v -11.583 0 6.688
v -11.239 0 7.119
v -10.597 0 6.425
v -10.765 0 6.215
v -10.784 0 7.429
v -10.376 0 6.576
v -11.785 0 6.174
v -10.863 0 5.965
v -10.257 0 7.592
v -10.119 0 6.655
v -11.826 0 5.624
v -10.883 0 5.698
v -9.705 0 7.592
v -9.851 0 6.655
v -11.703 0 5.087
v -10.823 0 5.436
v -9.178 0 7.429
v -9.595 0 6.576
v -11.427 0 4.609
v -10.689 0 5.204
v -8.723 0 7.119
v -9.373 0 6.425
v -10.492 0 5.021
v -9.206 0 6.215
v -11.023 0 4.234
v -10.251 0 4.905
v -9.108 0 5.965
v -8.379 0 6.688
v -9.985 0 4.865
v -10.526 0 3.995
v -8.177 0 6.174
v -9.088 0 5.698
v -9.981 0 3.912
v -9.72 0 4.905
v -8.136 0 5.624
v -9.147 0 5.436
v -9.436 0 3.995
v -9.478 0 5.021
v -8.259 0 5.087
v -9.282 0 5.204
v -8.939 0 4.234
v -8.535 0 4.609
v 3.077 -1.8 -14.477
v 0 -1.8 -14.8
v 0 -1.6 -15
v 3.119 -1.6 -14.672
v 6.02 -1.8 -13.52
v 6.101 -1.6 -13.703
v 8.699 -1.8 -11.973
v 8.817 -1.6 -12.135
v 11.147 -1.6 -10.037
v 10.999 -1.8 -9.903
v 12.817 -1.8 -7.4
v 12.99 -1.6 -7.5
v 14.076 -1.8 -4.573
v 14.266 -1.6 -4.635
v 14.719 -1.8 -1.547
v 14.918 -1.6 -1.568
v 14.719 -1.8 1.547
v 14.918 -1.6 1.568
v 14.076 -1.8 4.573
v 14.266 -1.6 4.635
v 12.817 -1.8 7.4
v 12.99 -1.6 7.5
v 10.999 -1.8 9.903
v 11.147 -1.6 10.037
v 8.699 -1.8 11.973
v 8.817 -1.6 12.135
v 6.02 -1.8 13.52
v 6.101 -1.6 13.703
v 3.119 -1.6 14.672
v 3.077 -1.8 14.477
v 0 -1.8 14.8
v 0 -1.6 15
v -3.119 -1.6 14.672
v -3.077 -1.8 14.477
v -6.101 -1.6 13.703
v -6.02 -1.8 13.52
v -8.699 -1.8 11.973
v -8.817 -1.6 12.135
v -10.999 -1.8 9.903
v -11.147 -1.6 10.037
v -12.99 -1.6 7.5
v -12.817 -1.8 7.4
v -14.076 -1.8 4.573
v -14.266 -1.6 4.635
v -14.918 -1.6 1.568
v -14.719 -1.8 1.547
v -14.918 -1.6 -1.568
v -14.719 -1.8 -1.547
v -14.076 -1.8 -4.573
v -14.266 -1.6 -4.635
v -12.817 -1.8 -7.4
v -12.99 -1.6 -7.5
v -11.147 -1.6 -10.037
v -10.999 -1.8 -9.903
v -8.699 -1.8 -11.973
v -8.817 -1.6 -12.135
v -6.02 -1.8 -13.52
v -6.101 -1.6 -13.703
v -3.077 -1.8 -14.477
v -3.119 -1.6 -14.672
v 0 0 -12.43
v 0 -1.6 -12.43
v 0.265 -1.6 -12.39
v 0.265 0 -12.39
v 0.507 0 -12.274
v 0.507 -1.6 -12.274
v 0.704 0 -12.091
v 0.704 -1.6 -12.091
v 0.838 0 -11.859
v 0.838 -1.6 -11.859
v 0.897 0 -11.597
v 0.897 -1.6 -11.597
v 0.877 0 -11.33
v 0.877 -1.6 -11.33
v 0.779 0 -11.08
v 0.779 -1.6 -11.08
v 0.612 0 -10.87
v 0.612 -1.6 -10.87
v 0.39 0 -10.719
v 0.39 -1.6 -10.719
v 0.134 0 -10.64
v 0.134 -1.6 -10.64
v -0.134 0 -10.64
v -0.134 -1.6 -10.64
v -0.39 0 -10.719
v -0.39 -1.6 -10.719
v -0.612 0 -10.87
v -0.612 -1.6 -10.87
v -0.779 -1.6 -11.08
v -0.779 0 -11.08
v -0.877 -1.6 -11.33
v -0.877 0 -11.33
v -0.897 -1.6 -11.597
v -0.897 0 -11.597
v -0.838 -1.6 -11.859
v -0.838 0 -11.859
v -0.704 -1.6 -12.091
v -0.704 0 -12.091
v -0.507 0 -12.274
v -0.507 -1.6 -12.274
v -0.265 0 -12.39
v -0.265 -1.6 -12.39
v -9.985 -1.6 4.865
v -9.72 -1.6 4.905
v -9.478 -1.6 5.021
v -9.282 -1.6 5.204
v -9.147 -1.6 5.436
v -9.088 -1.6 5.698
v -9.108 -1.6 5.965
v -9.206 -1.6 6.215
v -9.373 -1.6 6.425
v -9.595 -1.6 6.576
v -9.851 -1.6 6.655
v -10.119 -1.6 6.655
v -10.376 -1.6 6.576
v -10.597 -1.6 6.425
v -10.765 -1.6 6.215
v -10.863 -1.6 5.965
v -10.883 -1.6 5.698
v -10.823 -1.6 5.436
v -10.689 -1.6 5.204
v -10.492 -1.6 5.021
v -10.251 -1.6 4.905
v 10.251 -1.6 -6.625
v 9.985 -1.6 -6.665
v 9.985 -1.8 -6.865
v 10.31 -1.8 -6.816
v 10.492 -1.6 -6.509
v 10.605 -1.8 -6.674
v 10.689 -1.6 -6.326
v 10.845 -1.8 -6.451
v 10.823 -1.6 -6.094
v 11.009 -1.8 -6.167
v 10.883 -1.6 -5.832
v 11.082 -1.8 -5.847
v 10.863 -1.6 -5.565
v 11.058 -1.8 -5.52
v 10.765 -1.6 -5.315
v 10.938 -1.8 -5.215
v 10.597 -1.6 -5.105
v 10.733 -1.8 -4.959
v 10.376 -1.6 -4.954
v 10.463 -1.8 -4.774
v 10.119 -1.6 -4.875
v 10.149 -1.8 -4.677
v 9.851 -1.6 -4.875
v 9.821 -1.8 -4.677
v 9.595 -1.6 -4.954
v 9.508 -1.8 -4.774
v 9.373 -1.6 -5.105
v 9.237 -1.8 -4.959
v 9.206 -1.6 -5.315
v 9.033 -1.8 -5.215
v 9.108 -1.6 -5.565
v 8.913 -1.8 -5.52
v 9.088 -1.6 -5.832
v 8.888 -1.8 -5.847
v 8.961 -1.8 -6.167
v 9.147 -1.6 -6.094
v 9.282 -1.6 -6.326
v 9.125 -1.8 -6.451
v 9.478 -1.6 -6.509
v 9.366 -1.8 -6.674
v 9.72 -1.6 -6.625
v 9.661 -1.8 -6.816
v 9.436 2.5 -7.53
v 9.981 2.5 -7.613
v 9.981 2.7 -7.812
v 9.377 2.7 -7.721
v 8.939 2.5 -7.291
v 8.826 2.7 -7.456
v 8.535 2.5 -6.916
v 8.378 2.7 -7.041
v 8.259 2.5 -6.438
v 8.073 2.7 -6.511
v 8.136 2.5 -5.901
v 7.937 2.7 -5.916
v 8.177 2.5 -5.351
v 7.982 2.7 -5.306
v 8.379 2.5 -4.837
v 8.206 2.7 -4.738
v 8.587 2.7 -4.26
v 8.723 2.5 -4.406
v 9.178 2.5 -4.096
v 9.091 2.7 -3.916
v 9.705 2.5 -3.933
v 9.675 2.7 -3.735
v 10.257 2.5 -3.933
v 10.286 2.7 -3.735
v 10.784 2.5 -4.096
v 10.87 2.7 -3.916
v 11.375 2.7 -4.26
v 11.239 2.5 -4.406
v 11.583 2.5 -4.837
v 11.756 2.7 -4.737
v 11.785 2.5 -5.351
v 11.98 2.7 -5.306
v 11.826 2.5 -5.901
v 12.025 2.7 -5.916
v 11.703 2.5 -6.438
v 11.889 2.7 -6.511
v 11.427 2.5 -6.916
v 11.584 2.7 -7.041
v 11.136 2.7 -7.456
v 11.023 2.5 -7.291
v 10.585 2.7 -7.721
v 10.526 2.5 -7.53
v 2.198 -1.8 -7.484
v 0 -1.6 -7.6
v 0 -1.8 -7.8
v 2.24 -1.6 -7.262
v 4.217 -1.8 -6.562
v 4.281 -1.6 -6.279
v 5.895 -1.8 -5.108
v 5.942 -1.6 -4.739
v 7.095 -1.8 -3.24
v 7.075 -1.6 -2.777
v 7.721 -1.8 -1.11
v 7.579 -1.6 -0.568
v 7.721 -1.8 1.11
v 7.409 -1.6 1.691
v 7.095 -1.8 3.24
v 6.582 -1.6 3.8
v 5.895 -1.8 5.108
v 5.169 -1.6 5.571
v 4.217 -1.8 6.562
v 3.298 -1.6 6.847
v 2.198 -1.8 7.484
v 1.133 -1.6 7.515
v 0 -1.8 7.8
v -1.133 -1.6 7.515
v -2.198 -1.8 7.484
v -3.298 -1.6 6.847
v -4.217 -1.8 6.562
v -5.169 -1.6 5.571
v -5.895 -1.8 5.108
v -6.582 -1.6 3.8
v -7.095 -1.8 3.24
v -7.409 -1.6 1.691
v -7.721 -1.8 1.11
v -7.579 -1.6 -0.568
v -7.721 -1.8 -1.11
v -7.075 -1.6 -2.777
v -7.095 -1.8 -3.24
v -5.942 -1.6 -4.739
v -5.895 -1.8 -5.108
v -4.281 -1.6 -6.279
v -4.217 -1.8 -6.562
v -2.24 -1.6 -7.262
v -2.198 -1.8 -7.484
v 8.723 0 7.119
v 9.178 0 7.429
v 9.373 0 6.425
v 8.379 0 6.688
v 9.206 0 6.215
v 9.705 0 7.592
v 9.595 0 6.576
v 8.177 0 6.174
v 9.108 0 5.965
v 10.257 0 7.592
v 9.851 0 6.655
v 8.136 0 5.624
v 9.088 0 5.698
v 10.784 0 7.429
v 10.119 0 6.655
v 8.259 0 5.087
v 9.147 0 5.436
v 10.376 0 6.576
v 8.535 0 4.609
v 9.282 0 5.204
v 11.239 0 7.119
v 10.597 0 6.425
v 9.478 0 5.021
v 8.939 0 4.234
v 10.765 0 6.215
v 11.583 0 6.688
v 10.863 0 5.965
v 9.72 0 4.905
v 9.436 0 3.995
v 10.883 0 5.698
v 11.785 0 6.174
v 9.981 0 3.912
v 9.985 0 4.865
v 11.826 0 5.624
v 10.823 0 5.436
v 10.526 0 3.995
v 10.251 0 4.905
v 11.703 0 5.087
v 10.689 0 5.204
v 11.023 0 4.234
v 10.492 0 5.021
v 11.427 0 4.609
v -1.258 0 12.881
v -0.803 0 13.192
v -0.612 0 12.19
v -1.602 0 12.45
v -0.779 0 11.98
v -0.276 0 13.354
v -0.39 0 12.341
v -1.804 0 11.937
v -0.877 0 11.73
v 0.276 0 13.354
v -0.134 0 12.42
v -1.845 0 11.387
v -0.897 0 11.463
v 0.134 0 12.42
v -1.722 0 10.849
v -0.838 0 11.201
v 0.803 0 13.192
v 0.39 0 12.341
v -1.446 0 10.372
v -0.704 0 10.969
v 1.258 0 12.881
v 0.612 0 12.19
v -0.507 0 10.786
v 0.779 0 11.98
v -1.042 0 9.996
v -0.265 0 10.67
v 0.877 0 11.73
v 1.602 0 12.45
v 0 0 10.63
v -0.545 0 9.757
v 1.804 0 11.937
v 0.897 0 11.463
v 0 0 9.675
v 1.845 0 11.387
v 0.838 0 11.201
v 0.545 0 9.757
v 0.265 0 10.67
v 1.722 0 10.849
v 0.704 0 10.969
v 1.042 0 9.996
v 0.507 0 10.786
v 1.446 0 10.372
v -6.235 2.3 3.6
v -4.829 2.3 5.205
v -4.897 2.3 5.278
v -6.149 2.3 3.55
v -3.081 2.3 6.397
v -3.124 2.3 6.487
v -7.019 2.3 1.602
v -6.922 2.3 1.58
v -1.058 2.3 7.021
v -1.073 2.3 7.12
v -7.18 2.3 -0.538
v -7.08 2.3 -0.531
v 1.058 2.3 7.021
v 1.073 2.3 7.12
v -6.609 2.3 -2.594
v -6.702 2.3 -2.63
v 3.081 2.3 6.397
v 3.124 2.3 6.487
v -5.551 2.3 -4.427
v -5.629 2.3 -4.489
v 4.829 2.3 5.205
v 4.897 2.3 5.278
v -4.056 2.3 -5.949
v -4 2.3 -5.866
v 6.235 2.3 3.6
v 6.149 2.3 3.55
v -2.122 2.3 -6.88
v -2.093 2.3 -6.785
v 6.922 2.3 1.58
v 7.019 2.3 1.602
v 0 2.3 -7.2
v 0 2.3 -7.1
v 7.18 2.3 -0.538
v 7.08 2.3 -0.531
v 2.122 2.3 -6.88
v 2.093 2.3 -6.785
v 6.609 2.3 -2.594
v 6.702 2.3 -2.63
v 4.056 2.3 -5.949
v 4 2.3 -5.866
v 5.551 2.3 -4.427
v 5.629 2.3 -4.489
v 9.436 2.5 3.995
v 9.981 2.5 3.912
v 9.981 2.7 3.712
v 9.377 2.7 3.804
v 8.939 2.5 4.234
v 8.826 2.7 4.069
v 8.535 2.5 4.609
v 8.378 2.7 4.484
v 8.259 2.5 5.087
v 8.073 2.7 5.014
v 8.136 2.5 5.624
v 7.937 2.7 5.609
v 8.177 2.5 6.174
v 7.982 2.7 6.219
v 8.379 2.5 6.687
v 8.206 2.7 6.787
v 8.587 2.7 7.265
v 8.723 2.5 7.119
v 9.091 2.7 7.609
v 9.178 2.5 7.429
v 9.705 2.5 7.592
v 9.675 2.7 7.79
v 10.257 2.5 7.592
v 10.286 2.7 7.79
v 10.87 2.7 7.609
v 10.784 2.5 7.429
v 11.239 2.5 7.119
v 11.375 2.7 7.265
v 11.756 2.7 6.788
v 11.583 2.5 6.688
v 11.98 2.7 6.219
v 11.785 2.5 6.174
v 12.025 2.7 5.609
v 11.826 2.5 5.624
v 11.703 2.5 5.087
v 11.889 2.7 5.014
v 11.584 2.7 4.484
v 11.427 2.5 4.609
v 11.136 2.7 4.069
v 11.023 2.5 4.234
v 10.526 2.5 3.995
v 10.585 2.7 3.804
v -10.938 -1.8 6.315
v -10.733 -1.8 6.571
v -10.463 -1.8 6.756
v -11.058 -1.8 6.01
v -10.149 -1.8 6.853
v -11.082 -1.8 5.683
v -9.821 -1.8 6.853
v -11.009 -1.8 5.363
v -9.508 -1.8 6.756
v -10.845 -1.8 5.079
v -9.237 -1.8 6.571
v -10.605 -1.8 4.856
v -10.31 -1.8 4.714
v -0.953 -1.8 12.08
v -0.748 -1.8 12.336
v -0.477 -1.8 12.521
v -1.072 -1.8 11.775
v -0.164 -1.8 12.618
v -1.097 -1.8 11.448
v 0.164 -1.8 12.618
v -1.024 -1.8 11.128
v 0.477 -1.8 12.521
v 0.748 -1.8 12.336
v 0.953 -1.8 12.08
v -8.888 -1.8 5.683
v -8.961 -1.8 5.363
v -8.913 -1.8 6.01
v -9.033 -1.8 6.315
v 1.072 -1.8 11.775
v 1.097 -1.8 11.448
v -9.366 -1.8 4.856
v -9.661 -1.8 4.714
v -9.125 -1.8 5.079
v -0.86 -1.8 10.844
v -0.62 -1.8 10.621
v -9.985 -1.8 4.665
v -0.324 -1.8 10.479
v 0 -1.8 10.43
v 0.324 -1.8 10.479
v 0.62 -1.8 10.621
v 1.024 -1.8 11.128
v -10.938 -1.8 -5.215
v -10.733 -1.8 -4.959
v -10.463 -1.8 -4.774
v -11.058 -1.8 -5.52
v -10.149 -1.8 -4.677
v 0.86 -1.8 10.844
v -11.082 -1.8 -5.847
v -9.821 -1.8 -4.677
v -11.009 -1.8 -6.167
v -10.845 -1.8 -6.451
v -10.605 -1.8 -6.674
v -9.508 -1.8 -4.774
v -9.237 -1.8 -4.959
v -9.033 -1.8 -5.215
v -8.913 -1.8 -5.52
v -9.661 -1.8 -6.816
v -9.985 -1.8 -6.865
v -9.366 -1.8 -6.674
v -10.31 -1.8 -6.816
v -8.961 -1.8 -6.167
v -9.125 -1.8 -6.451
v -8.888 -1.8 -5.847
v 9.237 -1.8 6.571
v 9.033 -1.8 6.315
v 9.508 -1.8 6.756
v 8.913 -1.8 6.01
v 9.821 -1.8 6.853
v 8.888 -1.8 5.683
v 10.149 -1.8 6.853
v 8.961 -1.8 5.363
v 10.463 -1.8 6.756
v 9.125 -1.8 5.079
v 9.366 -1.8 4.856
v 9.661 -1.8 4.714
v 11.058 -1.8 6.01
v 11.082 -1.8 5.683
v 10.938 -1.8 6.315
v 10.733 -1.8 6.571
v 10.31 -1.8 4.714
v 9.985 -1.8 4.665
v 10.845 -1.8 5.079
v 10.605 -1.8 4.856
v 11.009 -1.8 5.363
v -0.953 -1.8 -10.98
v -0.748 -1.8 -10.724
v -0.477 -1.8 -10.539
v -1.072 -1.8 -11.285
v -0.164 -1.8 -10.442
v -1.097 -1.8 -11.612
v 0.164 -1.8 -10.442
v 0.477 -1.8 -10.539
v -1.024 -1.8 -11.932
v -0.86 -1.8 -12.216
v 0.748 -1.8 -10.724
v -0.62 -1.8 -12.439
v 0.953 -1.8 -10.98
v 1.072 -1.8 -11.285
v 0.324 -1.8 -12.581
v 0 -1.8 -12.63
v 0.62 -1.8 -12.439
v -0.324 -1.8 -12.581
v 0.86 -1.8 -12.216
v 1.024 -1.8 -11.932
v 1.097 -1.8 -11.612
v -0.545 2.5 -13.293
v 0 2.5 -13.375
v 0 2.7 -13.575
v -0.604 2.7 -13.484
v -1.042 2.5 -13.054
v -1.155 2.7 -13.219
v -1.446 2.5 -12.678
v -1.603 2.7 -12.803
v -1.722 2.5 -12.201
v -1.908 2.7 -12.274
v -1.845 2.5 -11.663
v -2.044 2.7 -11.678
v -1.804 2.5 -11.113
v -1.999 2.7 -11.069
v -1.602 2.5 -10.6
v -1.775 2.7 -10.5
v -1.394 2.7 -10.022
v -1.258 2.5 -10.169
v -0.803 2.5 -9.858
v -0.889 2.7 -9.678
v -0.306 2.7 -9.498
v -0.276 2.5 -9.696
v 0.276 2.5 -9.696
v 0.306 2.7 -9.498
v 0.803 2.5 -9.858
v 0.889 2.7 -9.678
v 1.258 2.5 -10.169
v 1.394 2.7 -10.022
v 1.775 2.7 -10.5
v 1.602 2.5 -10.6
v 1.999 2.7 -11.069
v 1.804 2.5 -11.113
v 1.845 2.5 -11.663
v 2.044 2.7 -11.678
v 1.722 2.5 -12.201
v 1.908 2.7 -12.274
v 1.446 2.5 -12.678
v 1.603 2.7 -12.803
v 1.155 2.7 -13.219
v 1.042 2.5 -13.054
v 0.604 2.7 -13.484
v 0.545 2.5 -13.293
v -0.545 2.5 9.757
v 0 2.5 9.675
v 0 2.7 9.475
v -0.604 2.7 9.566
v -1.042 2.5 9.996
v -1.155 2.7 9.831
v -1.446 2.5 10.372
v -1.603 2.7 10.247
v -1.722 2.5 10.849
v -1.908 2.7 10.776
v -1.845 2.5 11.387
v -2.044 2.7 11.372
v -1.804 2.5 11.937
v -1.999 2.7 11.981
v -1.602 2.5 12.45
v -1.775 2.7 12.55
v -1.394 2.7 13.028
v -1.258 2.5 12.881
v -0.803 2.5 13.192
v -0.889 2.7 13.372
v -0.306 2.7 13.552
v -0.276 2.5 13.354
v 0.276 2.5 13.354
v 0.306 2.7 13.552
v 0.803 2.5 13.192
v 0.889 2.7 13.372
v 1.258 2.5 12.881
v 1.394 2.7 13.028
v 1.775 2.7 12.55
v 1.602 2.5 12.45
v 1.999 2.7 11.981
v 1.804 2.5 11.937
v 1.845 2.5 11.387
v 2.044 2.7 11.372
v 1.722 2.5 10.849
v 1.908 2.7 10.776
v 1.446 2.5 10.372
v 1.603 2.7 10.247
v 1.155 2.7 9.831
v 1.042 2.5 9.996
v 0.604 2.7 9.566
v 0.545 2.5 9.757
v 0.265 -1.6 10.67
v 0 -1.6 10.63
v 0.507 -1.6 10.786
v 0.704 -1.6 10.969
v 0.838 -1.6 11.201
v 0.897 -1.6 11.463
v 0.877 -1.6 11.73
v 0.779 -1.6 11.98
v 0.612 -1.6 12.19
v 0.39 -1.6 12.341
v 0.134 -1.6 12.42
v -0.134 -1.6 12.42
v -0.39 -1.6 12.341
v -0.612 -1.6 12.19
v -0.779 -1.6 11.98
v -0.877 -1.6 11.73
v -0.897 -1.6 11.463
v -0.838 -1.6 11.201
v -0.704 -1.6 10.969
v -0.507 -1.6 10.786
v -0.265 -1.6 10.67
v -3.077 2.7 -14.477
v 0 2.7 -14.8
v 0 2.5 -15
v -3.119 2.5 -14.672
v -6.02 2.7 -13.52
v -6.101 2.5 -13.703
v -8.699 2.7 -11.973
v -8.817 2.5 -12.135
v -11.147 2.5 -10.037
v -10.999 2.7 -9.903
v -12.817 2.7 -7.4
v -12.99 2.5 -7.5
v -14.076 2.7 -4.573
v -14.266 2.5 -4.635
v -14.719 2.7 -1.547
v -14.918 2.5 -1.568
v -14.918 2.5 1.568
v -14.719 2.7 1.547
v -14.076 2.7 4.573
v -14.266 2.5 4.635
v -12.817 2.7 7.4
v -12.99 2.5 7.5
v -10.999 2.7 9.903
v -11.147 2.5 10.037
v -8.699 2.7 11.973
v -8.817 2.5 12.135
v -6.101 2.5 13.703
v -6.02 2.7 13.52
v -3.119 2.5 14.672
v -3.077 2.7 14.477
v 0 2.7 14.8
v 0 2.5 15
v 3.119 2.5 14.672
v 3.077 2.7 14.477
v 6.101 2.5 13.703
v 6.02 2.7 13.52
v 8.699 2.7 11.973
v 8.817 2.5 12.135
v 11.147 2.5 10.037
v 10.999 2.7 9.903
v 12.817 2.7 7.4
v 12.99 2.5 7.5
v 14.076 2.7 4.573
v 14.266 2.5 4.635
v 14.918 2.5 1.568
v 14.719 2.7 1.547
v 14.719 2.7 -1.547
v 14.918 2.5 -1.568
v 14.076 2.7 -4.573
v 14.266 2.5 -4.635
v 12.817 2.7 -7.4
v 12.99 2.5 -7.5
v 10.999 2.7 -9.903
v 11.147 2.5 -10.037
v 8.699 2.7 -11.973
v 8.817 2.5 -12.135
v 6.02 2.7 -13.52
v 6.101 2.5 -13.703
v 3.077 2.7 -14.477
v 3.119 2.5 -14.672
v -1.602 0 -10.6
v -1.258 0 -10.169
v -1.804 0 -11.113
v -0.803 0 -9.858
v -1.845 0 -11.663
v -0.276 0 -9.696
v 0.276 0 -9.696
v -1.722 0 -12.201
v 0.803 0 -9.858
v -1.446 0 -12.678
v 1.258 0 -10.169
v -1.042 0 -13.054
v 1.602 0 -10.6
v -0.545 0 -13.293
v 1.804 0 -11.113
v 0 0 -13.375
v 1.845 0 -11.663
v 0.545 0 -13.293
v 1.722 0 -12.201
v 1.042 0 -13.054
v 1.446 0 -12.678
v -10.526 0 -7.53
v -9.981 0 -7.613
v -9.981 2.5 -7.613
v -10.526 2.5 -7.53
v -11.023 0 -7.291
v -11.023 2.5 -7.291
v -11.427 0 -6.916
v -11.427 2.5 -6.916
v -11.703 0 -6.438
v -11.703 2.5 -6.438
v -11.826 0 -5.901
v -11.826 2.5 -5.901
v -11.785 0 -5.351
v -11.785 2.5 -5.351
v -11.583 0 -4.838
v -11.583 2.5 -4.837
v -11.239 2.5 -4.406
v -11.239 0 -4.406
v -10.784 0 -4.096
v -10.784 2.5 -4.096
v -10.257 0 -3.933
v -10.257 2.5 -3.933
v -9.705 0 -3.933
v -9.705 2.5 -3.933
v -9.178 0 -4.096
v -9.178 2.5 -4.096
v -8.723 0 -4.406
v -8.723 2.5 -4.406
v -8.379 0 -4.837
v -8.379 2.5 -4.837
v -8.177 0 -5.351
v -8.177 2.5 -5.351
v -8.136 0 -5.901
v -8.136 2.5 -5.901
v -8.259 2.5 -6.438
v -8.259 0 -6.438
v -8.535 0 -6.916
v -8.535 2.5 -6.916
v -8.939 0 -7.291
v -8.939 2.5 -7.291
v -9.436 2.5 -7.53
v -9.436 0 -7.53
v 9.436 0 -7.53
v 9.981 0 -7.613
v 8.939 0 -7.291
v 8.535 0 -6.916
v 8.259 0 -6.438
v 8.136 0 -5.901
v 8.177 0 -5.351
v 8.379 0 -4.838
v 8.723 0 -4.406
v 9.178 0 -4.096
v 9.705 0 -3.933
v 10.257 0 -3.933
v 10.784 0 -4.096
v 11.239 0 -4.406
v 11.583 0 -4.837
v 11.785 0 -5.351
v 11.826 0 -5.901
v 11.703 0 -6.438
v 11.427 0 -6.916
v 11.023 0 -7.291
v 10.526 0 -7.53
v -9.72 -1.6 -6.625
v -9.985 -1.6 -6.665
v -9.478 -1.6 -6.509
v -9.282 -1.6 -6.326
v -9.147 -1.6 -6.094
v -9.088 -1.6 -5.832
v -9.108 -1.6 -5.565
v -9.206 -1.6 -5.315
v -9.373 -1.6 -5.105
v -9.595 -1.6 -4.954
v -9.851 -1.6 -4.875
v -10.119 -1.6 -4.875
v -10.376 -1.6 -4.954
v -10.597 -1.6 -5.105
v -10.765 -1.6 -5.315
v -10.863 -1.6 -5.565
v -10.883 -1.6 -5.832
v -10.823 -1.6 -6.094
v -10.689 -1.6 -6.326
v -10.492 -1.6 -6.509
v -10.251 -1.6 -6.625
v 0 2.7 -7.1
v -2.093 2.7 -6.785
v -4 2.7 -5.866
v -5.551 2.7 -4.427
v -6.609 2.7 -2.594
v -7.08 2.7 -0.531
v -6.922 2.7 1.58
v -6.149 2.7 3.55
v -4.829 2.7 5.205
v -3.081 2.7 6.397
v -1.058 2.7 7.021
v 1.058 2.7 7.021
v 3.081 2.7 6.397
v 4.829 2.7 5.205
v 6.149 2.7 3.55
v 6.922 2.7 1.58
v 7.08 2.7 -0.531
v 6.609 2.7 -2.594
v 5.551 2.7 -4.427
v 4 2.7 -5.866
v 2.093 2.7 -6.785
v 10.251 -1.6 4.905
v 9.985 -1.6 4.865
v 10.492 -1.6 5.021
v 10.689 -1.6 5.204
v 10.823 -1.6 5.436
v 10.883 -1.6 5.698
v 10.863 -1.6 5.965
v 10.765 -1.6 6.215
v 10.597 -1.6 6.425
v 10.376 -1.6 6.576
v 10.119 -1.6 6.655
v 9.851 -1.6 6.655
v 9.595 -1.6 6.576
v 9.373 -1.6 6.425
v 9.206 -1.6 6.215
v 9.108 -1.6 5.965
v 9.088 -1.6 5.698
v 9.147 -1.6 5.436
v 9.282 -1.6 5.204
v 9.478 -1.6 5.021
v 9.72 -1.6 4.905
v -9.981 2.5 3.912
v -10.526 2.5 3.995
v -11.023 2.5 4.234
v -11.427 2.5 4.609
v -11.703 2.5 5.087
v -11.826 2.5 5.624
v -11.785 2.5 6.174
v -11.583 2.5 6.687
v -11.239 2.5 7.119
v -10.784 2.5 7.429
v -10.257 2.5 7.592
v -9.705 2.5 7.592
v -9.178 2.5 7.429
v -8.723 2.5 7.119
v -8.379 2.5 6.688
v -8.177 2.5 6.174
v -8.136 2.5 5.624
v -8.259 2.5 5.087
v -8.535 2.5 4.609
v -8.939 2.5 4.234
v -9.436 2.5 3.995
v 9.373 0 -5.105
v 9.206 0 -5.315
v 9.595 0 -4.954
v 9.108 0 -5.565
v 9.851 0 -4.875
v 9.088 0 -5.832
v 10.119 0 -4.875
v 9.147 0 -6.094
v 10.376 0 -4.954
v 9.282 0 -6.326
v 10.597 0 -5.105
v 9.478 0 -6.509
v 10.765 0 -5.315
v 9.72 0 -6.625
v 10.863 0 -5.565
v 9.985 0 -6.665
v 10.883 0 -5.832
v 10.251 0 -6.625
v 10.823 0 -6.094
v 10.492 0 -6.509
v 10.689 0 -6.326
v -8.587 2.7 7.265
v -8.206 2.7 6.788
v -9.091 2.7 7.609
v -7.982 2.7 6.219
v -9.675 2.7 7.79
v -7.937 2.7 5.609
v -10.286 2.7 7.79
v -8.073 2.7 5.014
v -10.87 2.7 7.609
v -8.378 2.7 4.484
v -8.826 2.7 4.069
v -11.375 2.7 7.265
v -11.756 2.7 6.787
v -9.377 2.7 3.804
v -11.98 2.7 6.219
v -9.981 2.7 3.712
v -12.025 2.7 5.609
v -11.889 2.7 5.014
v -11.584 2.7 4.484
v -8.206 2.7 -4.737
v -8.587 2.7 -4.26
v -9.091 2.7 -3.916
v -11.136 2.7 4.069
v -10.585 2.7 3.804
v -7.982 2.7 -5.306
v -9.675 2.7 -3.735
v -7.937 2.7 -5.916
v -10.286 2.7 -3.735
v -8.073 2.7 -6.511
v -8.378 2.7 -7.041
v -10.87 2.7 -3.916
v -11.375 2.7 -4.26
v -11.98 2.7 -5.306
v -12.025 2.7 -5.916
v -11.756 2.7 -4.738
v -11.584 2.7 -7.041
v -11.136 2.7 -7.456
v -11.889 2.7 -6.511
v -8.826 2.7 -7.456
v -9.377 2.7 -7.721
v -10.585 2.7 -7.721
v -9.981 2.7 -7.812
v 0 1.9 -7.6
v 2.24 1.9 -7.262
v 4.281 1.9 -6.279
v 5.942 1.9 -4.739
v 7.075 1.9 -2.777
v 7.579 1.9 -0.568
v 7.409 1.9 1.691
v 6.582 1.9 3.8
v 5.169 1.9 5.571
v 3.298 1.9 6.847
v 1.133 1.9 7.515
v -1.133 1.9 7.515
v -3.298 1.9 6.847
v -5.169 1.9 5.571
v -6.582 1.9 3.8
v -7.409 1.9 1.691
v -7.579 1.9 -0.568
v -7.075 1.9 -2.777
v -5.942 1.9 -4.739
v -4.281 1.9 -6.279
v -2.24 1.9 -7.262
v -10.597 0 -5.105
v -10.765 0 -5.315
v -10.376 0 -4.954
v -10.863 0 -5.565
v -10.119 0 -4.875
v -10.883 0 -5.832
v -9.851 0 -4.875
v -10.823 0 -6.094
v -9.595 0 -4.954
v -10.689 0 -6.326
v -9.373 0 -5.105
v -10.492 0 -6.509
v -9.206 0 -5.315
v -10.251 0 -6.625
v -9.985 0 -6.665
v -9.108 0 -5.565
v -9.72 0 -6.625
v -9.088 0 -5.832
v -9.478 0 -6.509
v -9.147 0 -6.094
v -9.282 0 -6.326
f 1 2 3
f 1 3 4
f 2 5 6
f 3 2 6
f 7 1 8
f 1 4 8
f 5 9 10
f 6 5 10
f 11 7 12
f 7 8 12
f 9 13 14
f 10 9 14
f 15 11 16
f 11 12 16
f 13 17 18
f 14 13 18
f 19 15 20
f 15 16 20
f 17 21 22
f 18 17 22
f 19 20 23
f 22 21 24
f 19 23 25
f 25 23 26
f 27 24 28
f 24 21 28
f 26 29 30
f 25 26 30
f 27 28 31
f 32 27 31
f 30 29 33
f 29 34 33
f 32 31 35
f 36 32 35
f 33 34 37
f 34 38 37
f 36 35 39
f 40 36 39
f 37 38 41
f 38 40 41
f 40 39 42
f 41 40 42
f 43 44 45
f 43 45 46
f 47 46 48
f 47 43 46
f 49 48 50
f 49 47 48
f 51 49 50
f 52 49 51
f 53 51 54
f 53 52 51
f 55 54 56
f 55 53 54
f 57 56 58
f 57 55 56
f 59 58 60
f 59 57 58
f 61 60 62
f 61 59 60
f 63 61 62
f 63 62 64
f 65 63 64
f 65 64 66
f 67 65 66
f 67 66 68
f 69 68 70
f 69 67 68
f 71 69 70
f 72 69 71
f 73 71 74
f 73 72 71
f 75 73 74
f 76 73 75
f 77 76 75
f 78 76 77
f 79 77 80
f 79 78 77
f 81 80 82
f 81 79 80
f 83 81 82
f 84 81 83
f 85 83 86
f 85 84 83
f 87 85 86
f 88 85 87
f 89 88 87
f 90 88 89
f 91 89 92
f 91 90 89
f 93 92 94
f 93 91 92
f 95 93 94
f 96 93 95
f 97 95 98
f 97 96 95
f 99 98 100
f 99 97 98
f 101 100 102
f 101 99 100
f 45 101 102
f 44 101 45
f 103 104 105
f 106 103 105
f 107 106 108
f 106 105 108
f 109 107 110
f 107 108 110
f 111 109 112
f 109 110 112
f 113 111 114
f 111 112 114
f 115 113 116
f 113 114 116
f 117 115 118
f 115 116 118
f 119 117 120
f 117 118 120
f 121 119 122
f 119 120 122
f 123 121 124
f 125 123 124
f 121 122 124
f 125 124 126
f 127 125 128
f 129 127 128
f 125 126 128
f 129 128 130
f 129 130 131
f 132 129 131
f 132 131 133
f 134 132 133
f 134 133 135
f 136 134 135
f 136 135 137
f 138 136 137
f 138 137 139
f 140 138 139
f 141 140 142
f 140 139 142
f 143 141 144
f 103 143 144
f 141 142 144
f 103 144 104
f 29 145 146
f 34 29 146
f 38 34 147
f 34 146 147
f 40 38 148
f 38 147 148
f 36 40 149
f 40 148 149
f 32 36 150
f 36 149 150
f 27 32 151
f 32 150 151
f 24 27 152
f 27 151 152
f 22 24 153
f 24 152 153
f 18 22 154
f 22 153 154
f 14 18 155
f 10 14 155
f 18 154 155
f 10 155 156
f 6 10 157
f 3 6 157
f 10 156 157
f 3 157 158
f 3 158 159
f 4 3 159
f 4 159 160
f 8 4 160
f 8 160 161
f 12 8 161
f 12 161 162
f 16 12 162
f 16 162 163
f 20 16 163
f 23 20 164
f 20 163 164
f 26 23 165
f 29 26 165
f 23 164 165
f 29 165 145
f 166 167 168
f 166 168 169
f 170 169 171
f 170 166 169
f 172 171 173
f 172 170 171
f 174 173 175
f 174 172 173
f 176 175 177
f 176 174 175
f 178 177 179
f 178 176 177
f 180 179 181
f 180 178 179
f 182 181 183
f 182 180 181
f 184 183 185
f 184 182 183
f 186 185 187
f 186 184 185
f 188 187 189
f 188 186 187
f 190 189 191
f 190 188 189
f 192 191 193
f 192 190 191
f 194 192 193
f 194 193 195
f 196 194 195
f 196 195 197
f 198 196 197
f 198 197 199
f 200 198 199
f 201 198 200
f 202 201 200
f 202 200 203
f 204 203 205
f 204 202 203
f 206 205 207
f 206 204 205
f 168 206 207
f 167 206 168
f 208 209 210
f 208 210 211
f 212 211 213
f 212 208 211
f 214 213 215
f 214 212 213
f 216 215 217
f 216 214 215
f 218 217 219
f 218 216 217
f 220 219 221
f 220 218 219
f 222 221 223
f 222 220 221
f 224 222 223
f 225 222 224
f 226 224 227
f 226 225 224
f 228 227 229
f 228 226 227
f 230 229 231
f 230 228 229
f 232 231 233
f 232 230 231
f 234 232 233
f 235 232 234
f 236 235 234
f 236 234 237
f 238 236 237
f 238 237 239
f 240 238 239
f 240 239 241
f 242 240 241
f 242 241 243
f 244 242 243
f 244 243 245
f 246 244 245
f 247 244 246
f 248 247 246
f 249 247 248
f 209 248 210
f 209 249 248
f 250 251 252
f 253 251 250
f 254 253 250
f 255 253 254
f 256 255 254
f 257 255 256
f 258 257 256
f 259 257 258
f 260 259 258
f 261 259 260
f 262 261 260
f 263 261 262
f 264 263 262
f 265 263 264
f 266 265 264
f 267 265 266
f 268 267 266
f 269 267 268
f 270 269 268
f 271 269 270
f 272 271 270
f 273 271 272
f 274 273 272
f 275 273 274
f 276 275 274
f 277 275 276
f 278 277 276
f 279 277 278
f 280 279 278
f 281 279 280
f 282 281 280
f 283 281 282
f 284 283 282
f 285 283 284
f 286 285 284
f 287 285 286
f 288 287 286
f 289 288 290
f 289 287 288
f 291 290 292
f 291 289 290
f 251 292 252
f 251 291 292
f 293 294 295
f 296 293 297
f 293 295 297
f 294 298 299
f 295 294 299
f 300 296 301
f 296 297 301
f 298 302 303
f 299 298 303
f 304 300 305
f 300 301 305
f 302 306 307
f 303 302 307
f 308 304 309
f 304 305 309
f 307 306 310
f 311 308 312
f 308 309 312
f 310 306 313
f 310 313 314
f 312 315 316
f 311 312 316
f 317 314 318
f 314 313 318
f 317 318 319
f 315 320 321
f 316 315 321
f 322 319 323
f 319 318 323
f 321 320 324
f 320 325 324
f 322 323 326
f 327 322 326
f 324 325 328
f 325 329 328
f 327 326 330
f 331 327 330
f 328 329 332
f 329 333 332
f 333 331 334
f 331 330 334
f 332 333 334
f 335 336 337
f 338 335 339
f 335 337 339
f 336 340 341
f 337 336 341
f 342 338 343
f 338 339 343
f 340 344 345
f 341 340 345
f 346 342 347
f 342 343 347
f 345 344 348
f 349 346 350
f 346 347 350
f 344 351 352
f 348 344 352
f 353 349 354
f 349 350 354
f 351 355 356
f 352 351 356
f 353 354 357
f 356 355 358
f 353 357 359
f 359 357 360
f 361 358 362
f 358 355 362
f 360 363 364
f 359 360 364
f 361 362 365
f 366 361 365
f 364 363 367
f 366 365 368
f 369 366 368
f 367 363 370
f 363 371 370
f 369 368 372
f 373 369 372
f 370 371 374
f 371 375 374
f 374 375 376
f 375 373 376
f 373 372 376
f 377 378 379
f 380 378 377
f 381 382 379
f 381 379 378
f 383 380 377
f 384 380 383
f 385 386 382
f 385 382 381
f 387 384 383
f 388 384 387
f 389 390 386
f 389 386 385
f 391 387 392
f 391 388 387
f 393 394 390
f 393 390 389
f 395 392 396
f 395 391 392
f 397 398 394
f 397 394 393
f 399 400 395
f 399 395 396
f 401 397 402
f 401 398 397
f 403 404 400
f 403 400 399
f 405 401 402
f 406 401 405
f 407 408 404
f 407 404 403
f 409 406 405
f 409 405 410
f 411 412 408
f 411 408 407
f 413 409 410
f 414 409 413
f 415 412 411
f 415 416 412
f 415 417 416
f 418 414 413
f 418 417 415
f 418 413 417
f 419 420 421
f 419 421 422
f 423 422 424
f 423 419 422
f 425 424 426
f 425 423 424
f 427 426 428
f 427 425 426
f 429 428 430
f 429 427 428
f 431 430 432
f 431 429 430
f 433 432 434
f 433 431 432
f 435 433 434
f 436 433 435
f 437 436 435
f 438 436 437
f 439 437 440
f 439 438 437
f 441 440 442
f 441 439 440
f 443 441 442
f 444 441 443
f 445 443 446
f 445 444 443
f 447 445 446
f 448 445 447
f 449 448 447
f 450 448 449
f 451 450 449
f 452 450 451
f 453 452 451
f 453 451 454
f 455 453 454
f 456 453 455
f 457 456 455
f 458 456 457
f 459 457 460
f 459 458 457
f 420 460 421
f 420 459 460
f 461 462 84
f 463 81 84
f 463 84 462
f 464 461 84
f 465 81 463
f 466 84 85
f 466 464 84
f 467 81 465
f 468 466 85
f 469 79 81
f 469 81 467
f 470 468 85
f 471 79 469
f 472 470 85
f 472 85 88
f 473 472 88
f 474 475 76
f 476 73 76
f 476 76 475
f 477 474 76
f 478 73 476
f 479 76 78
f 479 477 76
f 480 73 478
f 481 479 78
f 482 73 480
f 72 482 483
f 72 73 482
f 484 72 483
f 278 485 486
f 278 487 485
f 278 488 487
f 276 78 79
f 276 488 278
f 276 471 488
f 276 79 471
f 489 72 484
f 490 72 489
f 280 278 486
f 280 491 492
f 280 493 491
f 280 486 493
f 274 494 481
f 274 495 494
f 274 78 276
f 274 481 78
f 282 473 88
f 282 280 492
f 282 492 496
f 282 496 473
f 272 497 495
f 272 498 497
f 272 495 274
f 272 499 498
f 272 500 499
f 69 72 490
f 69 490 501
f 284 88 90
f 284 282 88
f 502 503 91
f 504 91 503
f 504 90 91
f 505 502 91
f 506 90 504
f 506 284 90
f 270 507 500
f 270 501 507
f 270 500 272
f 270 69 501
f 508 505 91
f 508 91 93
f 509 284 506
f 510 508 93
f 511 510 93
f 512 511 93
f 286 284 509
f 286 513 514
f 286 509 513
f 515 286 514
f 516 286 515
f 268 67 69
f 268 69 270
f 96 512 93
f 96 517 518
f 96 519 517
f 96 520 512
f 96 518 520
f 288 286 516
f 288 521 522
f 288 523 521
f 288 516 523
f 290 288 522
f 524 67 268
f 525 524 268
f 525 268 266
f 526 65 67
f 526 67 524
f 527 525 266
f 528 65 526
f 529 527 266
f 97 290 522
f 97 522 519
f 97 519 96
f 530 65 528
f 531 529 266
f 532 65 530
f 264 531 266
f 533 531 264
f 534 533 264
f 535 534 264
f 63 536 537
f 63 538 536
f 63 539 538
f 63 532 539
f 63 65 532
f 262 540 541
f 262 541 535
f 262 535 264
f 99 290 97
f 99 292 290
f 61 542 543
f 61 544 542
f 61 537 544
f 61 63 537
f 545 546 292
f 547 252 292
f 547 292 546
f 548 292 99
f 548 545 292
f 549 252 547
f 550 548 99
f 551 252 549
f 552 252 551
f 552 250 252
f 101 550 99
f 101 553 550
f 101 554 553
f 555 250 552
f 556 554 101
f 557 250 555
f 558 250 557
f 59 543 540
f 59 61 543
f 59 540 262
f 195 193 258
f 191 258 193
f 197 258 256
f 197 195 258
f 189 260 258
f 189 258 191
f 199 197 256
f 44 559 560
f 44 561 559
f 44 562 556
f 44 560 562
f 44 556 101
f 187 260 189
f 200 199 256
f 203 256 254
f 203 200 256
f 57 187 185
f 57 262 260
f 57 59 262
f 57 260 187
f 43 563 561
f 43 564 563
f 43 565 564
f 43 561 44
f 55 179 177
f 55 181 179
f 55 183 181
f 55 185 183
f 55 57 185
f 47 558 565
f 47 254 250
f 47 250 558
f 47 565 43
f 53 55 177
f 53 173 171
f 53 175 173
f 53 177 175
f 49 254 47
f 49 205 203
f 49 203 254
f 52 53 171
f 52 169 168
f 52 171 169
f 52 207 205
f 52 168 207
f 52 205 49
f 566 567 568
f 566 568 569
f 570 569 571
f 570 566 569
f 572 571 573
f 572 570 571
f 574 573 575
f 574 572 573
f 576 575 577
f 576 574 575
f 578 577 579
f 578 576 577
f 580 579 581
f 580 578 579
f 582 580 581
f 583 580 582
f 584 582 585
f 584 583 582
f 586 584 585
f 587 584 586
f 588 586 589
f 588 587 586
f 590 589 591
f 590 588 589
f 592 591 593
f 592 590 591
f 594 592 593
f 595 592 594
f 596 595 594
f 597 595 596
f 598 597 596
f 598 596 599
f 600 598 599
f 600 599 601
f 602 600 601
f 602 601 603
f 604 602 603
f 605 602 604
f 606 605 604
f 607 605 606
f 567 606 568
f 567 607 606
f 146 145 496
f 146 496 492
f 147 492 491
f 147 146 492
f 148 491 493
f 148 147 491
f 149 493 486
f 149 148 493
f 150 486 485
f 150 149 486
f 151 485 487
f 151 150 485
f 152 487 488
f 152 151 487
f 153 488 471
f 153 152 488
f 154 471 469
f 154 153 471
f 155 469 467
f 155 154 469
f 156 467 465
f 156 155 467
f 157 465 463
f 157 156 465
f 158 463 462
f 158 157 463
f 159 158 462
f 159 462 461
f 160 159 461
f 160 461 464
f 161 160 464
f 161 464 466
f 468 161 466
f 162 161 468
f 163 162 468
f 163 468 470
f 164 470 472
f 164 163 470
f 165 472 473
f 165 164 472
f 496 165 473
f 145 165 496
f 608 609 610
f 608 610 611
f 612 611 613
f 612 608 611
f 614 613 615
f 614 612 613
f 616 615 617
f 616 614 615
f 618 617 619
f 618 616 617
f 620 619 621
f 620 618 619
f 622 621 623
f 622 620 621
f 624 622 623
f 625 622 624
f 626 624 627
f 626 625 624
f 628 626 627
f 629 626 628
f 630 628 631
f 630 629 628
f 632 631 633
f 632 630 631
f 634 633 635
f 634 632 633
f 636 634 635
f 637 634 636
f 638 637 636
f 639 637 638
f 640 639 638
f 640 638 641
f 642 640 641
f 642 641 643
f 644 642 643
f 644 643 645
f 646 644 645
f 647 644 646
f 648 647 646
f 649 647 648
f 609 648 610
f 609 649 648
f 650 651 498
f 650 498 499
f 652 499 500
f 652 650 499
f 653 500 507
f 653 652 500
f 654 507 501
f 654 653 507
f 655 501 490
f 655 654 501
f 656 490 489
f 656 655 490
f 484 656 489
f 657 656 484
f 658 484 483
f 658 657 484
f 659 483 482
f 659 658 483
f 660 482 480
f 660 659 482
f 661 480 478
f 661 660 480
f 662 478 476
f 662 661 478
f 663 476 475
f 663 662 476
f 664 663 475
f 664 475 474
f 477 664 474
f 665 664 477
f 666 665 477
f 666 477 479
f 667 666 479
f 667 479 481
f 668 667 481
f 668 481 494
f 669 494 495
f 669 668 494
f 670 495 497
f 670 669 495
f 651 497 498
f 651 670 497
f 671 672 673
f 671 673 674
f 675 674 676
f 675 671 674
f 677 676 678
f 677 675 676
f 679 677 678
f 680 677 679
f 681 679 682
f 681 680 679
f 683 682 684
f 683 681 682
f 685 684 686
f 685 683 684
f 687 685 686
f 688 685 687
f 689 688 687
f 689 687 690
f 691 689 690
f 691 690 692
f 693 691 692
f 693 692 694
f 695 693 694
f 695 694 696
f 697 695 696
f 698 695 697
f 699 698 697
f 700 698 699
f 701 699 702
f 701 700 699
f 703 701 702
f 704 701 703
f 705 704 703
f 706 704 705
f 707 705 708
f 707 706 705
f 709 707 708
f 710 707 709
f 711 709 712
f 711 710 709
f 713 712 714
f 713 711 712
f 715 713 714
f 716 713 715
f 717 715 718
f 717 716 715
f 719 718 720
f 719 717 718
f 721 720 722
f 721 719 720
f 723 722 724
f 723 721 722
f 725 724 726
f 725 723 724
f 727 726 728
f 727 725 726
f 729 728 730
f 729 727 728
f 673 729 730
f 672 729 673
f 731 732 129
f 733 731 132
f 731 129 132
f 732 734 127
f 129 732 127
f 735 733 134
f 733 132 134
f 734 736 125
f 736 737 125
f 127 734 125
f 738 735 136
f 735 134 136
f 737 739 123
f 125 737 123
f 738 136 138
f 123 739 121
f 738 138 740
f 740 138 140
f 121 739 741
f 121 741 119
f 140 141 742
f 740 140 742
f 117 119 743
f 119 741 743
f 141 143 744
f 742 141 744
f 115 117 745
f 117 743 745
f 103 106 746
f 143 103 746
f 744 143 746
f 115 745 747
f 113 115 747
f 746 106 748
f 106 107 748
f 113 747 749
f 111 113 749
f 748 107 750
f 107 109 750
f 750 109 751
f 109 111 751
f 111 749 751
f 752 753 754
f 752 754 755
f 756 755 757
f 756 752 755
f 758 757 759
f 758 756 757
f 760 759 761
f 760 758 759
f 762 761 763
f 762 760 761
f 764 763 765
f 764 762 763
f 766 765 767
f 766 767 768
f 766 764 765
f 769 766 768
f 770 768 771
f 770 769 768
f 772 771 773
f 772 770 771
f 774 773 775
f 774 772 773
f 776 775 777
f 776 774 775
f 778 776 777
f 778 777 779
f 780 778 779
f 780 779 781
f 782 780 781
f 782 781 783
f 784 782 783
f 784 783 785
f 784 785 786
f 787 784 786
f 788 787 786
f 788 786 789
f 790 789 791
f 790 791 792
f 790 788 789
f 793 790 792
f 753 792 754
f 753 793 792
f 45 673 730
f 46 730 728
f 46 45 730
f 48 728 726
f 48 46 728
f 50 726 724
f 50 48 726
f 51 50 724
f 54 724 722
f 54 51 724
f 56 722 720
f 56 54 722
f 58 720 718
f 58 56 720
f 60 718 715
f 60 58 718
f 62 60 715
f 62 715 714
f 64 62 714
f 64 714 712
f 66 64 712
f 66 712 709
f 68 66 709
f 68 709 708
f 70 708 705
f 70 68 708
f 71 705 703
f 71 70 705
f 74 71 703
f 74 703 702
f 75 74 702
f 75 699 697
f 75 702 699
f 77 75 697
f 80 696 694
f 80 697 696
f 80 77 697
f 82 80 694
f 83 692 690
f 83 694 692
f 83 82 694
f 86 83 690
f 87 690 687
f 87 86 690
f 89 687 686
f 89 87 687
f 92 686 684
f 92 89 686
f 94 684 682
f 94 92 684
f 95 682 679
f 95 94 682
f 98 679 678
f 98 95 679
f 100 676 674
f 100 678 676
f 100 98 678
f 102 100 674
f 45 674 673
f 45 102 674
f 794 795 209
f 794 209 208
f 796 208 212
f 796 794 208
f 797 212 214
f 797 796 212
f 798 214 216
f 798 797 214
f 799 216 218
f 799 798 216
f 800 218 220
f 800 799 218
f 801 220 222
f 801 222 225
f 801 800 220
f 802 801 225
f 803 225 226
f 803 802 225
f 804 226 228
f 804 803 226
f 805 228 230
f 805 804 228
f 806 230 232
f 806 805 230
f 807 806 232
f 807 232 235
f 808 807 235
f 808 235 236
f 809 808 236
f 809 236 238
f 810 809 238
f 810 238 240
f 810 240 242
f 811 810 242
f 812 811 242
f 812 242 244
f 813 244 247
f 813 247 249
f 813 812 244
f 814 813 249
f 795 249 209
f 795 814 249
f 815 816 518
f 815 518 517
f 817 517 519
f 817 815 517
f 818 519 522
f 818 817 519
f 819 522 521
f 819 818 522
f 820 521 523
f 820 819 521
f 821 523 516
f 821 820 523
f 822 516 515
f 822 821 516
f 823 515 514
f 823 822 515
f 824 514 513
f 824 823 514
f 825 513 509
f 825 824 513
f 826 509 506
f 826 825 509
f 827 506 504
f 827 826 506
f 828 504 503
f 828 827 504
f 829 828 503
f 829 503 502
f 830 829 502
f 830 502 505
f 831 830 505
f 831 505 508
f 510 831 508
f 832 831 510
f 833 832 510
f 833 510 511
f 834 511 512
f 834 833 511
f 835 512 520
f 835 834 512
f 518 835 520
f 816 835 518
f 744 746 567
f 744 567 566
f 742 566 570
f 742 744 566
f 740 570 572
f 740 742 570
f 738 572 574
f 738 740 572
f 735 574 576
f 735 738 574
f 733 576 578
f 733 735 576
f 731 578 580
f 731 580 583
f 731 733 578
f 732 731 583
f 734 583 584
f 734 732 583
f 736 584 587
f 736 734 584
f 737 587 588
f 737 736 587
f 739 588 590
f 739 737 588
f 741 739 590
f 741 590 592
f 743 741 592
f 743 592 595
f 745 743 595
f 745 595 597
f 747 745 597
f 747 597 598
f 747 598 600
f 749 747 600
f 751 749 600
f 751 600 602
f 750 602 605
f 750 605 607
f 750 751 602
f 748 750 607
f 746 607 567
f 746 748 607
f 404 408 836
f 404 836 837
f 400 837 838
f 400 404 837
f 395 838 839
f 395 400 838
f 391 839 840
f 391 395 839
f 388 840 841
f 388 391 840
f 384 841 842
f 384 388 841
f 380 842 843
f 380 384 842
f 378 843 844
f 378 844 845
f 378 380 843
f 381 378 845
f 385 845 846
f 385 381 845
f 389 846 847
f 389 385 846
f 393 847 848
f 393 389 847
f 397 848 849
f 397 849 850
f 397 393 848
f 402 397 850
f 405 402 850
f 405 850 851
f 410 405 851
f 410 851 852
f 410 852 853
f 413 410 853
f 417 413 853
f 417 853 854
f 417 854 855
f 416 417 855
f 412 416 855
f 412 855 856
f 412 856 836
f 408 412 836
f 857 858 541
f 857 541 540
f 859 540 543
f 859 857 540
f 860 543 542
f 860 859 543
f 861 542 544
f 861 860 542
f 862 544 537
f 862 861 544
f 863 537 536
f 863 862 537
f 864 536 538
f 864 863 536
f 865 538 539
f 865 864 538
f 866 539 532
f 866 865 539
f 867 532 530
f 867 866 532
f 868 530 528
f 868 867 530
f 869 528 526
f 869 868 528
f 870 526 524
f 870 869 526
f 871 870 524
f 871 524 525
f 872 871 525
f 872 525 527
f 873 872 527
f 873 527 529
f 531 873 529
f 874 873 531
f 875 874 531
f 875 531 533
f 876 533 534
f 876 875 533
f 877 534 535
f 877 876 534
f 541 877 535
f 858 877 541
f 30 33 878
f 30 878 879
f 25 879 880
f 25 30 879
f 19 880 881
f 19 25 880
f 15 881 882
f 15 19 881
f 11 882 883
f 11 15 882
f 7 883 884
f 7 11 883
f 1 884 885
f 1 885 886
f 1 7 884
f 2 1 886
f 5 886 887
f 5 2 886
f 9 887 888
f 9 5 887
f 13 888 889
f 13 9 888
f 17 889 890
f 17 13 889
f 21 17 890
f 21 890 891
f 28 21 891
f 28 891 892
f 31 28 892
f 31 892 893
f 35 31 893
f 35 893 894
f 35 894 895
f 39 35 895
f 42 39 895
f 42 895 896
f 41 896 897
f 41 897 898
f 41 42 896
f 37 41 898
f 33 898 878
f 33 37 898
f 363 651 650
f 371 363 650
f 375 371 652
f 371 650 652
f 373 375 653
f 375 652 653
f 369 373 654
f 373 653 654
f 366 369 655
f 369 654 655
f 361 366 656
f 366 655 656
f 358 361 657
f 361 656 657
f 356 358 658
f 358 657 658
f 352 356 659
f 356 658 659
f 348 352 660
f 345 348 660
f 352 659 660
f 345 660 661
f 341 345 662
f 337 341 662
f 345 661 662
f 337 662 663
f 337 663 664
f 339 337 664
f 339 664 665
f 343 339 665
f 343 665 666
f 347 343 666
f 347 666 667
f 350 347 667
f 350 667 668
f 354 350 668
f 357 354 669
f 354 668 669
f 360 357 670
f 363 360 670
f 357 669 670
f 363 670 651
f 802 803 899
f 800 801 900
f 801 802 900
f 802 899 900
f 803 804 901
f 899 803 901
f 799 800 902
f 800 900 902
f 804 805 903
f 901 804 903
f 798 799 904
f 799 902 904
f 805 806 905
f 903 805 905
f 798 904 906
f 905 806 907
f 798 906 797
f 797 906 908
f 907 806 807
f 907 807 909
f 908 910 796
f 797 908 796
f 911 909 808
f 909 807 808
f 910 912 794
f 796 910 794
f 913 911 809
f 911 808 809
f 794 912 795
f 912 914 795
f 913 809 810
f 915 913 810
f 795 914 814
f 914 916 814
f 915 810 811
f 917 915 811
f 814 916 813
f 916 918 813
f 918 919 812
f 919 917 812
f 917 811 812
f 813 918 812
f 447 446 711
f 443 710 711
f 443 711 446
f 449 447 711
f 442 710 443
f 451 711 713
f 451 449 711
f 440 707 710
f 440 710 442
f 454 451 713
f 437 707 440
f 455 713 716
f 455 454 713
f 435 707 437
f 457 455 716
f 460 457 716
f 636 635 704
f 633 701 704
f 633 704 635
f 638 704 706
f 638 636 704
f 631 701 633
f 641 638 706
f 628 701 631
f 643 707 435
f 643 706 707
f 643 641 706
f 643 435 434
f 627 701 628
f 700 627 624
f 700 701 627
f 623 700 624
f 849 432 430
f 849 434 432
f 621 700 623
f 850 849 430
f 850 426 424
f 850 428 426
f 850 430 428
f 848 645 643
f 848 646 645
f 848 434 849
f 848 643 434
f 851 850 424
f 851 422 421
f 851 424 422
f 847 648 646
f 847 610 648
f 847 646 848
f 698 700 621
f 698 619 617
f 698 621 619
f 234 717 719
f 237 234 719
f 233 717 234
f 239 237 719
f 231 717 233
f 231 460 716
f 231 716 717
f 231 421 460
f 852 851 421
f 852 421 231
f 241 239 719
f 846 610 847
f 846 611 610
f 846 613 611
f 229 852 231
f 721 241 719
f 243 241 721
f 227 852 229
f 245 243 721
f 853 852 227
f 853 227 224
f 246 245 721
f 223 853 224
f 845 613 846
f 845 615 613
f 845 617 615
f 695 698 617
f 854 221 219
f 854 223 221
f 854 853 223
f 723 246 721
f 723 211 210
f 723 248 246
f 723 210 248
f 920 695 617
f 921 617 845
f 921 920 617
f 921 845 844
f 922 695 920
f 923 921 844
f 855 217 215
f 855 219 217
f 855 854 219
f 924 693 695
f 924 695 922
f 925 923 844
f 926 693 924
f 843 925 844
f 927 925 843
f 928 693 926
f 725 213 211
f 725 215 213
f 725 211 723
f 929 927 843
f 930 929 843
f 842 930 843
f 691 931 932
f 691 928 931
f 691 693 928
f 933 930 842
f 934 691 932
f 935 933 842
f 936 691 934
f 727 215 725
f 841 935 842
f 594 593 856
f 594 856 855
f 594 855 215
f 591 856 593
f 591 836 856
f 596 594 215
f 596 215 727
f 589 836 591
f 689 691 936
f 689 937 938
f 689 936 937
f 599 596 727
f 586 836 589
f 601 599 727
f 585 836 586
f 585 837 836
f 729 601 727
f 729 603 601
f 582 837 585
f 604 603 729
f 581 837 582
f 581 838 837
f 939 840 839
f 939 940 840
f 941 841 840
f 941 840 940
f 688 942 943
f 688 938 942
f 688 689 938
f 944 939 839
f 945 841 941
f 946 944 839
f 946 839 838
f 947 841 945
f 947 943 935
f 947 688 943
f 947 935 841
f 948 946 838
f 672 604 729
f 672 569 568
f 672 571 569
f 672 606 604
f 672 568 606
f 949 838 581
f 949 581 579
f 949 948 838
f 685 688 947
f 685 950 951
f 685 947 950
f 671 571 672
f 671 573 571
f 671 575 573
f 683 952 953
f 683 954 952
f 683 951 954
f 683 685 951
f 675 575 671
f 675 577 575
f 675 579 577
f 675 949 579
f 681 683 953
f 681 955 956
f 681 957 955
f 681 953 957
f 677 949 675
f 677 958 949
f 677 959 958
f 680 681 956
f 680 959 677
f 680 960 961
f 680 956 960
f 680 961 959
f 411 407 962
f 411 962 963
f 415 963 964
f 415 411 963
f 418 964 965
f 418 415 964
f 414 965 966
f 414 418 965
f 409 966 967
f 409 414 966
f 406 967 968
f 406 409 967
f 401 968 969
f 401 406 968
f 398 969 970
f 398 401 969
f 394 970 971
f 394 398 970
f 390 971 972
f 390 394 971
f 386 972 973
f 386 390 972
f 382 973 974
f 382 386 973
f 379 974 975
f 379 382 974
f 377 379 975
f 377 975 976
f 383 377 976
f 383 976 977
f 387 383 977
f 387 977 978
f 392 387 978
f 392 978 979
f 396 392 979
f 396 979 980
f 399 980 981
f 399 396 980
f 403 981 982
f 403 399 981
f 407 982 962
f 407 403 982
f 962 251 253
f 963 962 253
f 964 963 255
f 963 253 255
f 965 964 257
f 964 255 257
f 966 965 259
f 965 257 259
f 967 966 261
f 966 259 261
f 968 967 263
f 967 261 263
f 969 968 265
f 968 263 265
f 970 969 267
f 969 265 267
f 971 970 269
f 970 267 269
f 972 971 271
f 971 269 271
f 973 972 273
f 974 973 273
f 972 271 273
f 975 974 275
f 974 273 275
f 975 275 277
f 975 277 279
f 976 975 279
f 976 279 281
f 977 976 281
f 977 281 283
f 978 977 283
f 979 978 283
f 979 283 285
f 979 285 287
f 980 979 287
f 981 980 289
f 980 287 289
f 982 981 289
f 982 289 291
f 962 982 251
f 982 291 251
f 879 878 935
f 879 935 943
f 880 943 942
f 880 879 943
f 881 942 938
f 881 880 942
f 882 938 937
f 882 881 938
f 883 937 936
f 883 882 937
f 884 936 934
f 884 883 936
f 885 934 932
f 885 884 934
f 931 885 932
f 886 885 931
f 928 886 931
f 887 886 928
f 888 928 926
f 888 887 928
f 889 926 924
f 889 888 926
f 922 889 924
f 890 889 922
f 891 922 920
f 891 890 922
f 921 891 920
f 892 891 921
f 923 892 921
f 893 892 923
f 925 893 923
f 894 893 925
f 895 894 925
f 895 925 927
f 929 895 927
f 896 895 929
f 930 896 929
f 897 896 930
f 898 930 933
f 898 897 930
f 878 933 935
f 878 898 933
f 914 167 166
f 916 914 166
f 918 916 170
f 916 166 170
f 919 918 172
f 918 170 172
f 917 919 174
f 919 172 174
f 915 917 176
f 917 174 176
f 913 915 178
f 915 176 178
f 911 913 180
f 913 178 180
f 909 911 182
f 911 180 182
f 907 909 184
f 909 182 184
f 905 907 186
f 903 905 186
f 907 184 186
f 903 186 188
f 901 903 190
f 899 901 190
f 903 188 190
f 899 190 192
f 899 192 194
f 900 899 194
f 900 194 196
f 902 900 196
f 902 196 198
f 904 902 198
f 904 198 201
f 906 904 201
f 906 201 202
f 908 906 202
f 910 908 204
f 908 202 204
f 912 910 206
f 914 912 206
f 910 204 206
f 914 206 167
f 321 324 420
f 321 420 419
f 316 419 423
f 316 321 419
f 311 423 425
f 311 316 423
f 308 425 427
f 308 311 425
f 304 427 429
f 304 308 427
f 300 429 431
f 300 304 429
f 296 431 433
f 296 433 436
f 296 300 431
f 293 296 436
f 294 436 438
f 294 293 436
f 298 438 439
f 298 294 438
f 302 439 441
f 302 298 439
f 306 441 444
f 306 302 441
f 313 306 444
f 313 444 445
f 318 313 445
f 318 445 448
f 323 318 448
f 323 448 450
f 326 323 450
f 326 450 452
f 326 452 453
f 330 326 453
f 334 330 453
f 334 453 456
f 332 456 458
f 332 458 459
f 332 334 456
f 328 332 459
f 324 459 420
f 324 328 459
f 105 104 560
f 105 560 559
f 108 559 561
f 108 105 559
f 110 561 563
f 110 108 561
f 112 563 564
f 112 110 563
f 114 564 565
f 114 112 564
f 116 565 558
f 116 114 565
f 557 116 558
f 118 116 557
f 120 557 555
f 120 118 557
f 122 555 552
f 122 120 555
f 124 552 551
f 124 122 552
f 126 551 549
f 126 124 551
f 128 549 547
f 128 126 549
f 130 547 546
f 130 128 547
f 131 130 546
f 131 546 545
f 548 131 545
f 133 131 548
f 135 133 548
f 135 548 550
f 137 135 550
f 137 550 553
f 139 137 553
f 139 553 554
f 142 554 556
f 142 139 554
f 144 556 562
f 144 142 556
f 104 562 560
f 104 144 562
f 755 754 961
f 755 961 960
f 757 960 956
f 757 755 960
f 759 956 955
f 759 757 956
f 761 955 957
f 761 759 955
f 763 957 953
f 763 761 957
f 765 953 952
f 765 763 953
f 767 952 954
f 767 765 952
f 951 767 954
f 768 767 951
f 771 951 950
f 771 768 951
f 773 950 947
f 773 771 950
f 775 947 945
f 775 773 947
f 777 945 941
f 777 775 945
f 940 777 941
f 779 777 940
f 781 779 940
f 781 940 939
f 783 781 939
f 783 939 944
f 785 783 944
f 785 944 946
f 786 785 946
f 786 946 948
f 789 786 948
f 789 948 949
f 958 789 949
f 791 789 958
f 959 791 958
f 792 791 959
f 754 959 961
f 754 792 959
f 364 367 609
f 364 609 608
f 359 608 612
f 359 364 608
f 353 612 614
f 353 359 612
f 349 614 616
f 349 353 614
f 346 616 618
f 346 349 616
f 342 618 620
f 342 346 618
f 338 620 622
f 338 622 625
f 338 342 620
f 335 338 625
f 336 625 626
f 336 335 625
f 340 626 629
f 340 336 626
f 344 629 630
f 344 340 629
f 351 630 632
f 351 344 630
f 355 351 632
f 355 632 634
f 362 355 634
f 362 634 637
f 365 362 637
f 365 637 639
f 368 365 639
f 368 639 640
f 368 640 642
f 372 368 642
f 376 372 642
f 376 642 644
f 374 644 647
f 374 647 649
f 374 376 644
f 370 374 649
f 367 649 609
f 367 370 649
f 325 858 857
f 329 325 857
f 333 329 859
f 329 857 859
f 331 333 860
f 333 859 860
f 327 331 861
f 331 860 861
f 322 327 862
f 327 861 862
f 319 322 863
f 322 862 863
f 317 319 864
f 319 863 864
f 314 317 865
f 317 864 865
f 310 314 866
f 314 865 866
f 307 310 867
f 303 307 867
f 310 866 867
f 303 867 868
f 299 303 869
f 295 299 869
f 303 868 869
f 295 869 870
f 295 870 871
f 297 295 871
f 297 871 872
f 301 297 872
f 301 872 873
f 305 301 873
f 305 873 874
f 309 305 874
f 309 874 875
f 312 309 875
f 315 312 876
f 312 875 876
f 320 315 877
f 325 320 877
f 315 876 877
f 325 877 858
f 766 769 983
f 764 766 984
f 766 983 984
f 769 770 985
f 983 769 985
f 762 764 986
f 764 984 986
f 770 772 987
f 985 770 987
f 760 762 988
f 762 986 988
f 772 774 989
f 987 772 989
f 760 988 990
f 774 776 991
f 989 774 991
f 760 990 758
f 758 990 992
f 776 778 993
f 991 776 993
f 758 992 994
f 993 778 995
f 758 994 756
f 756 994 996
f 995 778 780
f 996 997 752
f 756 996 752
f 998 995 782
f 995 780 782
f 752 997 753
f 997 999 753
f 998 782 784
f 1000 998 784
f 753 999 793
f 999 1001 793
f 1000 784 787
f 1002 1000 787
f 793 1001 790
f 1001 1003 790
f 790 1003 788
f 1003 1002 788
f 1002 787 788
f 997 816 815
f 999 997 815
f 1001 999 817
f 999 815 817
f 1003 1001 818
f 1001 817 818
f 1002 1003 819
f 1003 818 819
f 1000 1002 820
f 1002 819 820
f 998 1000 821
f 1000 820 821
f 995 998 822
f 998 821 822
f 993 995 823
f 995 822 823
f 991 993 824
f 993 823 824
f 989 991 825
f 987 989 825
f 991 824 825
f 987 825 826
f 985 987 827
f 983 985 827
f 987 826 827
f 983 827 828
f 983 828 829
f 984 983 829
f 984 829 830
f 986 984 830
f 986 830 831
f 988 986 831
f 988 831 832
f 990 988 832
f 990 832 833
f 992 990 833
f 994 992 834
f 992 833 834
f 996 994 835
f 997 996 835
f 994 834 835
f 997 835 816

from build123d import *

# Parameters (mm, degrees)
SKETCH_1_R          = 15
SKETCH_1_R_2        = 7.1
SKETCH_1_R_3        = 1.85
EXTRUDE_1_DEPTH     = 2.7
EXTRUDE_START       = 1.8
SKETCH_2_R          = 15
SKETCH_2_R_2        = 7.1
SKETCH_2_R_3        = 0.9
EXTRUDE_2_DEPTH     = 1.8
SKETCH_3_R          = 7.6
CUT_EXTRUDE_1_DEPTH = 4.1
CHAMFER_1_SIZE      = 0.2
CHAMFER_2_SIZE      = 0.4


with BuildPart() as part:
    # 草图1 → 凸台-拉伸1 (new body)
    with BuildSketch(Plane(origin=(0, 0, 0), x_dir=(1, 0, 0), z_dir=(0, 1, 0))):
        with Locations(Location((0, 0, 0), (0, 0, 90))):
            Circle(SKETCH_1_R)
        with Locations(Location((0, 0, 0), (0, 0, 90))):
            Circle(SKETCH_1_R_2, mode=Mode.SUBTRACT)
        with Locations(Location((0, 11.525, 0), (0, 0, 90))):
            Circle(SKETCH_1_R_3, mode=Mode.SUBTRACT)
        with Locations(Location((9.980942779, 5.7625, 0), (0, 0, 90))):
            Circle(SKETCH_1_R_3, mode=Mode.SUBTRACT)
        with Locations(Location((9.980942779, -5.7625, 0), (0, 0, 90))):
            Circle(SKETCH_1_R_3, mode=Mode.SUBTRACT)
        with Locations(Location((0, -11.525, 0), (0, 0, 90))):
            Circle(SKETCH_1_R_3, mode=Mode.SUBTRACT)
        with Locations(Location((-9.980942779, -5.7625, 0), (0, 0, 90))):
            Circle(SKETCH_1_R_3, mode=Mode.SUBTRACT)
        with Locations(Location((-9.980942779, 5.7625, 0), (0, 0, 90))):
            Circle(SKETCH_1_R_3, mode=Mode.SUBTRACT)
    extrude(amount=EXTRUDE_1_DEPTH)

    # 草图2 → 凸台-拉伸2 (add)
    with BuildSketch(Plane(origin=(0, 0, 0), x_dir=(-1, 0, 0), z_dir=(0, -1, 0)).offset(EXTRUDE_START)):
        with Locations(Location((0, 0, 0), (0, 0, 90))):
            Circle(SKETCH_2_R)
        with Locations(Location((0, 0, 0), (0, 0, 90))):
            Circle(SKETCH_2_R_2, mode=Mode.SUBTRACT)
        with Locations(Location((0, 11.53, 0), (0, 0, 90))):
            Circle(SKETCH_2_R_3, mode=Mode.SUBTRACT)
        with Locations(Location((9.985272906, 5.765, 0), (0, 0, 90))):
            Circle(SKETCH_2_R_3, mode=Mode.SUBTRACT)
        with Locations(Location((9.985272906, -5.765, 0), (0, 0, 90))):
            Circle(SKETCH_2_R_3, mode=Mode.SUBTRACT)
        with Locations(Location((0, -11.53, 0), (0, 0, 90))):
            Circle(SKETCH_2_R_3, mode=Mode.SUBTRACT)
        with Locations(Location((-9.985272906, -5.765, 0), (0, 0, 90))):
            Circle(SKETCH_2_R_3, mode=Mode.SUBTRACT)
        with Locations(Location((-9.985272906, 5.765, 0), (0, 0, 90))):
            Circle(SKETCH_2_R_3, mode=Mode.SUBTRACT)
    extrude(amount=-EXTRUDE_2_DEPTH)

    # 草图3 → 切除-拉伸1 (cut)
    with BuildSketch(Plane(origin=(0, -1.8, 0), x_dir=(-1, 0, 0), z_dir=(0, -1, 0))):
        with Locations(Location((0, 0, 0), (0, 0, 90))):
            Circle(SKETCH_3_R)
    extrude(amount=-CUT_EXTRUDE_1_DEPTH, mode=Mode.SUBTRACT)

    # 倒角1
    chamfer_1_edges = [part.edges().sort_by_distance(p)[0] for p in [
        (9.980942779, 2.7, -3.9125),
        (9.980942779, 2.7, 7.6125),
        (0, 2.7, 13.375),
        (-9.980942779, 2.7, 7.6125),
        (-9.980942779, 2.7, -3.9125),
        (0, -1.8, 15),
        (0, -1.8, -10.63),
        (-9.985272906, -1.8, -4.865),
        (-9.985272906, -1.8, 6.665),
        (0, -1.8, 12.43),
        (9.985272906, -1.8, 6.665),
        (9.985272906, -1.8, -4.865),
        (0, 2.7, 15),
        (0, -1.8, 7.6),
        (0, 2.7, -9.675),
    ]]
    chamfer(chamfer_1_edges, length=CHAMFER_1_SIZE)

    # 倒角2
    chamfer_2_edges = [part.edges().sort_by_distance(p)[0] for p in [
        (0, 2.3, 7.6),
    ]]
    chamfer(chamfer_2_edges, length=CHAMFER_2_SIZE)


solid = part.part
